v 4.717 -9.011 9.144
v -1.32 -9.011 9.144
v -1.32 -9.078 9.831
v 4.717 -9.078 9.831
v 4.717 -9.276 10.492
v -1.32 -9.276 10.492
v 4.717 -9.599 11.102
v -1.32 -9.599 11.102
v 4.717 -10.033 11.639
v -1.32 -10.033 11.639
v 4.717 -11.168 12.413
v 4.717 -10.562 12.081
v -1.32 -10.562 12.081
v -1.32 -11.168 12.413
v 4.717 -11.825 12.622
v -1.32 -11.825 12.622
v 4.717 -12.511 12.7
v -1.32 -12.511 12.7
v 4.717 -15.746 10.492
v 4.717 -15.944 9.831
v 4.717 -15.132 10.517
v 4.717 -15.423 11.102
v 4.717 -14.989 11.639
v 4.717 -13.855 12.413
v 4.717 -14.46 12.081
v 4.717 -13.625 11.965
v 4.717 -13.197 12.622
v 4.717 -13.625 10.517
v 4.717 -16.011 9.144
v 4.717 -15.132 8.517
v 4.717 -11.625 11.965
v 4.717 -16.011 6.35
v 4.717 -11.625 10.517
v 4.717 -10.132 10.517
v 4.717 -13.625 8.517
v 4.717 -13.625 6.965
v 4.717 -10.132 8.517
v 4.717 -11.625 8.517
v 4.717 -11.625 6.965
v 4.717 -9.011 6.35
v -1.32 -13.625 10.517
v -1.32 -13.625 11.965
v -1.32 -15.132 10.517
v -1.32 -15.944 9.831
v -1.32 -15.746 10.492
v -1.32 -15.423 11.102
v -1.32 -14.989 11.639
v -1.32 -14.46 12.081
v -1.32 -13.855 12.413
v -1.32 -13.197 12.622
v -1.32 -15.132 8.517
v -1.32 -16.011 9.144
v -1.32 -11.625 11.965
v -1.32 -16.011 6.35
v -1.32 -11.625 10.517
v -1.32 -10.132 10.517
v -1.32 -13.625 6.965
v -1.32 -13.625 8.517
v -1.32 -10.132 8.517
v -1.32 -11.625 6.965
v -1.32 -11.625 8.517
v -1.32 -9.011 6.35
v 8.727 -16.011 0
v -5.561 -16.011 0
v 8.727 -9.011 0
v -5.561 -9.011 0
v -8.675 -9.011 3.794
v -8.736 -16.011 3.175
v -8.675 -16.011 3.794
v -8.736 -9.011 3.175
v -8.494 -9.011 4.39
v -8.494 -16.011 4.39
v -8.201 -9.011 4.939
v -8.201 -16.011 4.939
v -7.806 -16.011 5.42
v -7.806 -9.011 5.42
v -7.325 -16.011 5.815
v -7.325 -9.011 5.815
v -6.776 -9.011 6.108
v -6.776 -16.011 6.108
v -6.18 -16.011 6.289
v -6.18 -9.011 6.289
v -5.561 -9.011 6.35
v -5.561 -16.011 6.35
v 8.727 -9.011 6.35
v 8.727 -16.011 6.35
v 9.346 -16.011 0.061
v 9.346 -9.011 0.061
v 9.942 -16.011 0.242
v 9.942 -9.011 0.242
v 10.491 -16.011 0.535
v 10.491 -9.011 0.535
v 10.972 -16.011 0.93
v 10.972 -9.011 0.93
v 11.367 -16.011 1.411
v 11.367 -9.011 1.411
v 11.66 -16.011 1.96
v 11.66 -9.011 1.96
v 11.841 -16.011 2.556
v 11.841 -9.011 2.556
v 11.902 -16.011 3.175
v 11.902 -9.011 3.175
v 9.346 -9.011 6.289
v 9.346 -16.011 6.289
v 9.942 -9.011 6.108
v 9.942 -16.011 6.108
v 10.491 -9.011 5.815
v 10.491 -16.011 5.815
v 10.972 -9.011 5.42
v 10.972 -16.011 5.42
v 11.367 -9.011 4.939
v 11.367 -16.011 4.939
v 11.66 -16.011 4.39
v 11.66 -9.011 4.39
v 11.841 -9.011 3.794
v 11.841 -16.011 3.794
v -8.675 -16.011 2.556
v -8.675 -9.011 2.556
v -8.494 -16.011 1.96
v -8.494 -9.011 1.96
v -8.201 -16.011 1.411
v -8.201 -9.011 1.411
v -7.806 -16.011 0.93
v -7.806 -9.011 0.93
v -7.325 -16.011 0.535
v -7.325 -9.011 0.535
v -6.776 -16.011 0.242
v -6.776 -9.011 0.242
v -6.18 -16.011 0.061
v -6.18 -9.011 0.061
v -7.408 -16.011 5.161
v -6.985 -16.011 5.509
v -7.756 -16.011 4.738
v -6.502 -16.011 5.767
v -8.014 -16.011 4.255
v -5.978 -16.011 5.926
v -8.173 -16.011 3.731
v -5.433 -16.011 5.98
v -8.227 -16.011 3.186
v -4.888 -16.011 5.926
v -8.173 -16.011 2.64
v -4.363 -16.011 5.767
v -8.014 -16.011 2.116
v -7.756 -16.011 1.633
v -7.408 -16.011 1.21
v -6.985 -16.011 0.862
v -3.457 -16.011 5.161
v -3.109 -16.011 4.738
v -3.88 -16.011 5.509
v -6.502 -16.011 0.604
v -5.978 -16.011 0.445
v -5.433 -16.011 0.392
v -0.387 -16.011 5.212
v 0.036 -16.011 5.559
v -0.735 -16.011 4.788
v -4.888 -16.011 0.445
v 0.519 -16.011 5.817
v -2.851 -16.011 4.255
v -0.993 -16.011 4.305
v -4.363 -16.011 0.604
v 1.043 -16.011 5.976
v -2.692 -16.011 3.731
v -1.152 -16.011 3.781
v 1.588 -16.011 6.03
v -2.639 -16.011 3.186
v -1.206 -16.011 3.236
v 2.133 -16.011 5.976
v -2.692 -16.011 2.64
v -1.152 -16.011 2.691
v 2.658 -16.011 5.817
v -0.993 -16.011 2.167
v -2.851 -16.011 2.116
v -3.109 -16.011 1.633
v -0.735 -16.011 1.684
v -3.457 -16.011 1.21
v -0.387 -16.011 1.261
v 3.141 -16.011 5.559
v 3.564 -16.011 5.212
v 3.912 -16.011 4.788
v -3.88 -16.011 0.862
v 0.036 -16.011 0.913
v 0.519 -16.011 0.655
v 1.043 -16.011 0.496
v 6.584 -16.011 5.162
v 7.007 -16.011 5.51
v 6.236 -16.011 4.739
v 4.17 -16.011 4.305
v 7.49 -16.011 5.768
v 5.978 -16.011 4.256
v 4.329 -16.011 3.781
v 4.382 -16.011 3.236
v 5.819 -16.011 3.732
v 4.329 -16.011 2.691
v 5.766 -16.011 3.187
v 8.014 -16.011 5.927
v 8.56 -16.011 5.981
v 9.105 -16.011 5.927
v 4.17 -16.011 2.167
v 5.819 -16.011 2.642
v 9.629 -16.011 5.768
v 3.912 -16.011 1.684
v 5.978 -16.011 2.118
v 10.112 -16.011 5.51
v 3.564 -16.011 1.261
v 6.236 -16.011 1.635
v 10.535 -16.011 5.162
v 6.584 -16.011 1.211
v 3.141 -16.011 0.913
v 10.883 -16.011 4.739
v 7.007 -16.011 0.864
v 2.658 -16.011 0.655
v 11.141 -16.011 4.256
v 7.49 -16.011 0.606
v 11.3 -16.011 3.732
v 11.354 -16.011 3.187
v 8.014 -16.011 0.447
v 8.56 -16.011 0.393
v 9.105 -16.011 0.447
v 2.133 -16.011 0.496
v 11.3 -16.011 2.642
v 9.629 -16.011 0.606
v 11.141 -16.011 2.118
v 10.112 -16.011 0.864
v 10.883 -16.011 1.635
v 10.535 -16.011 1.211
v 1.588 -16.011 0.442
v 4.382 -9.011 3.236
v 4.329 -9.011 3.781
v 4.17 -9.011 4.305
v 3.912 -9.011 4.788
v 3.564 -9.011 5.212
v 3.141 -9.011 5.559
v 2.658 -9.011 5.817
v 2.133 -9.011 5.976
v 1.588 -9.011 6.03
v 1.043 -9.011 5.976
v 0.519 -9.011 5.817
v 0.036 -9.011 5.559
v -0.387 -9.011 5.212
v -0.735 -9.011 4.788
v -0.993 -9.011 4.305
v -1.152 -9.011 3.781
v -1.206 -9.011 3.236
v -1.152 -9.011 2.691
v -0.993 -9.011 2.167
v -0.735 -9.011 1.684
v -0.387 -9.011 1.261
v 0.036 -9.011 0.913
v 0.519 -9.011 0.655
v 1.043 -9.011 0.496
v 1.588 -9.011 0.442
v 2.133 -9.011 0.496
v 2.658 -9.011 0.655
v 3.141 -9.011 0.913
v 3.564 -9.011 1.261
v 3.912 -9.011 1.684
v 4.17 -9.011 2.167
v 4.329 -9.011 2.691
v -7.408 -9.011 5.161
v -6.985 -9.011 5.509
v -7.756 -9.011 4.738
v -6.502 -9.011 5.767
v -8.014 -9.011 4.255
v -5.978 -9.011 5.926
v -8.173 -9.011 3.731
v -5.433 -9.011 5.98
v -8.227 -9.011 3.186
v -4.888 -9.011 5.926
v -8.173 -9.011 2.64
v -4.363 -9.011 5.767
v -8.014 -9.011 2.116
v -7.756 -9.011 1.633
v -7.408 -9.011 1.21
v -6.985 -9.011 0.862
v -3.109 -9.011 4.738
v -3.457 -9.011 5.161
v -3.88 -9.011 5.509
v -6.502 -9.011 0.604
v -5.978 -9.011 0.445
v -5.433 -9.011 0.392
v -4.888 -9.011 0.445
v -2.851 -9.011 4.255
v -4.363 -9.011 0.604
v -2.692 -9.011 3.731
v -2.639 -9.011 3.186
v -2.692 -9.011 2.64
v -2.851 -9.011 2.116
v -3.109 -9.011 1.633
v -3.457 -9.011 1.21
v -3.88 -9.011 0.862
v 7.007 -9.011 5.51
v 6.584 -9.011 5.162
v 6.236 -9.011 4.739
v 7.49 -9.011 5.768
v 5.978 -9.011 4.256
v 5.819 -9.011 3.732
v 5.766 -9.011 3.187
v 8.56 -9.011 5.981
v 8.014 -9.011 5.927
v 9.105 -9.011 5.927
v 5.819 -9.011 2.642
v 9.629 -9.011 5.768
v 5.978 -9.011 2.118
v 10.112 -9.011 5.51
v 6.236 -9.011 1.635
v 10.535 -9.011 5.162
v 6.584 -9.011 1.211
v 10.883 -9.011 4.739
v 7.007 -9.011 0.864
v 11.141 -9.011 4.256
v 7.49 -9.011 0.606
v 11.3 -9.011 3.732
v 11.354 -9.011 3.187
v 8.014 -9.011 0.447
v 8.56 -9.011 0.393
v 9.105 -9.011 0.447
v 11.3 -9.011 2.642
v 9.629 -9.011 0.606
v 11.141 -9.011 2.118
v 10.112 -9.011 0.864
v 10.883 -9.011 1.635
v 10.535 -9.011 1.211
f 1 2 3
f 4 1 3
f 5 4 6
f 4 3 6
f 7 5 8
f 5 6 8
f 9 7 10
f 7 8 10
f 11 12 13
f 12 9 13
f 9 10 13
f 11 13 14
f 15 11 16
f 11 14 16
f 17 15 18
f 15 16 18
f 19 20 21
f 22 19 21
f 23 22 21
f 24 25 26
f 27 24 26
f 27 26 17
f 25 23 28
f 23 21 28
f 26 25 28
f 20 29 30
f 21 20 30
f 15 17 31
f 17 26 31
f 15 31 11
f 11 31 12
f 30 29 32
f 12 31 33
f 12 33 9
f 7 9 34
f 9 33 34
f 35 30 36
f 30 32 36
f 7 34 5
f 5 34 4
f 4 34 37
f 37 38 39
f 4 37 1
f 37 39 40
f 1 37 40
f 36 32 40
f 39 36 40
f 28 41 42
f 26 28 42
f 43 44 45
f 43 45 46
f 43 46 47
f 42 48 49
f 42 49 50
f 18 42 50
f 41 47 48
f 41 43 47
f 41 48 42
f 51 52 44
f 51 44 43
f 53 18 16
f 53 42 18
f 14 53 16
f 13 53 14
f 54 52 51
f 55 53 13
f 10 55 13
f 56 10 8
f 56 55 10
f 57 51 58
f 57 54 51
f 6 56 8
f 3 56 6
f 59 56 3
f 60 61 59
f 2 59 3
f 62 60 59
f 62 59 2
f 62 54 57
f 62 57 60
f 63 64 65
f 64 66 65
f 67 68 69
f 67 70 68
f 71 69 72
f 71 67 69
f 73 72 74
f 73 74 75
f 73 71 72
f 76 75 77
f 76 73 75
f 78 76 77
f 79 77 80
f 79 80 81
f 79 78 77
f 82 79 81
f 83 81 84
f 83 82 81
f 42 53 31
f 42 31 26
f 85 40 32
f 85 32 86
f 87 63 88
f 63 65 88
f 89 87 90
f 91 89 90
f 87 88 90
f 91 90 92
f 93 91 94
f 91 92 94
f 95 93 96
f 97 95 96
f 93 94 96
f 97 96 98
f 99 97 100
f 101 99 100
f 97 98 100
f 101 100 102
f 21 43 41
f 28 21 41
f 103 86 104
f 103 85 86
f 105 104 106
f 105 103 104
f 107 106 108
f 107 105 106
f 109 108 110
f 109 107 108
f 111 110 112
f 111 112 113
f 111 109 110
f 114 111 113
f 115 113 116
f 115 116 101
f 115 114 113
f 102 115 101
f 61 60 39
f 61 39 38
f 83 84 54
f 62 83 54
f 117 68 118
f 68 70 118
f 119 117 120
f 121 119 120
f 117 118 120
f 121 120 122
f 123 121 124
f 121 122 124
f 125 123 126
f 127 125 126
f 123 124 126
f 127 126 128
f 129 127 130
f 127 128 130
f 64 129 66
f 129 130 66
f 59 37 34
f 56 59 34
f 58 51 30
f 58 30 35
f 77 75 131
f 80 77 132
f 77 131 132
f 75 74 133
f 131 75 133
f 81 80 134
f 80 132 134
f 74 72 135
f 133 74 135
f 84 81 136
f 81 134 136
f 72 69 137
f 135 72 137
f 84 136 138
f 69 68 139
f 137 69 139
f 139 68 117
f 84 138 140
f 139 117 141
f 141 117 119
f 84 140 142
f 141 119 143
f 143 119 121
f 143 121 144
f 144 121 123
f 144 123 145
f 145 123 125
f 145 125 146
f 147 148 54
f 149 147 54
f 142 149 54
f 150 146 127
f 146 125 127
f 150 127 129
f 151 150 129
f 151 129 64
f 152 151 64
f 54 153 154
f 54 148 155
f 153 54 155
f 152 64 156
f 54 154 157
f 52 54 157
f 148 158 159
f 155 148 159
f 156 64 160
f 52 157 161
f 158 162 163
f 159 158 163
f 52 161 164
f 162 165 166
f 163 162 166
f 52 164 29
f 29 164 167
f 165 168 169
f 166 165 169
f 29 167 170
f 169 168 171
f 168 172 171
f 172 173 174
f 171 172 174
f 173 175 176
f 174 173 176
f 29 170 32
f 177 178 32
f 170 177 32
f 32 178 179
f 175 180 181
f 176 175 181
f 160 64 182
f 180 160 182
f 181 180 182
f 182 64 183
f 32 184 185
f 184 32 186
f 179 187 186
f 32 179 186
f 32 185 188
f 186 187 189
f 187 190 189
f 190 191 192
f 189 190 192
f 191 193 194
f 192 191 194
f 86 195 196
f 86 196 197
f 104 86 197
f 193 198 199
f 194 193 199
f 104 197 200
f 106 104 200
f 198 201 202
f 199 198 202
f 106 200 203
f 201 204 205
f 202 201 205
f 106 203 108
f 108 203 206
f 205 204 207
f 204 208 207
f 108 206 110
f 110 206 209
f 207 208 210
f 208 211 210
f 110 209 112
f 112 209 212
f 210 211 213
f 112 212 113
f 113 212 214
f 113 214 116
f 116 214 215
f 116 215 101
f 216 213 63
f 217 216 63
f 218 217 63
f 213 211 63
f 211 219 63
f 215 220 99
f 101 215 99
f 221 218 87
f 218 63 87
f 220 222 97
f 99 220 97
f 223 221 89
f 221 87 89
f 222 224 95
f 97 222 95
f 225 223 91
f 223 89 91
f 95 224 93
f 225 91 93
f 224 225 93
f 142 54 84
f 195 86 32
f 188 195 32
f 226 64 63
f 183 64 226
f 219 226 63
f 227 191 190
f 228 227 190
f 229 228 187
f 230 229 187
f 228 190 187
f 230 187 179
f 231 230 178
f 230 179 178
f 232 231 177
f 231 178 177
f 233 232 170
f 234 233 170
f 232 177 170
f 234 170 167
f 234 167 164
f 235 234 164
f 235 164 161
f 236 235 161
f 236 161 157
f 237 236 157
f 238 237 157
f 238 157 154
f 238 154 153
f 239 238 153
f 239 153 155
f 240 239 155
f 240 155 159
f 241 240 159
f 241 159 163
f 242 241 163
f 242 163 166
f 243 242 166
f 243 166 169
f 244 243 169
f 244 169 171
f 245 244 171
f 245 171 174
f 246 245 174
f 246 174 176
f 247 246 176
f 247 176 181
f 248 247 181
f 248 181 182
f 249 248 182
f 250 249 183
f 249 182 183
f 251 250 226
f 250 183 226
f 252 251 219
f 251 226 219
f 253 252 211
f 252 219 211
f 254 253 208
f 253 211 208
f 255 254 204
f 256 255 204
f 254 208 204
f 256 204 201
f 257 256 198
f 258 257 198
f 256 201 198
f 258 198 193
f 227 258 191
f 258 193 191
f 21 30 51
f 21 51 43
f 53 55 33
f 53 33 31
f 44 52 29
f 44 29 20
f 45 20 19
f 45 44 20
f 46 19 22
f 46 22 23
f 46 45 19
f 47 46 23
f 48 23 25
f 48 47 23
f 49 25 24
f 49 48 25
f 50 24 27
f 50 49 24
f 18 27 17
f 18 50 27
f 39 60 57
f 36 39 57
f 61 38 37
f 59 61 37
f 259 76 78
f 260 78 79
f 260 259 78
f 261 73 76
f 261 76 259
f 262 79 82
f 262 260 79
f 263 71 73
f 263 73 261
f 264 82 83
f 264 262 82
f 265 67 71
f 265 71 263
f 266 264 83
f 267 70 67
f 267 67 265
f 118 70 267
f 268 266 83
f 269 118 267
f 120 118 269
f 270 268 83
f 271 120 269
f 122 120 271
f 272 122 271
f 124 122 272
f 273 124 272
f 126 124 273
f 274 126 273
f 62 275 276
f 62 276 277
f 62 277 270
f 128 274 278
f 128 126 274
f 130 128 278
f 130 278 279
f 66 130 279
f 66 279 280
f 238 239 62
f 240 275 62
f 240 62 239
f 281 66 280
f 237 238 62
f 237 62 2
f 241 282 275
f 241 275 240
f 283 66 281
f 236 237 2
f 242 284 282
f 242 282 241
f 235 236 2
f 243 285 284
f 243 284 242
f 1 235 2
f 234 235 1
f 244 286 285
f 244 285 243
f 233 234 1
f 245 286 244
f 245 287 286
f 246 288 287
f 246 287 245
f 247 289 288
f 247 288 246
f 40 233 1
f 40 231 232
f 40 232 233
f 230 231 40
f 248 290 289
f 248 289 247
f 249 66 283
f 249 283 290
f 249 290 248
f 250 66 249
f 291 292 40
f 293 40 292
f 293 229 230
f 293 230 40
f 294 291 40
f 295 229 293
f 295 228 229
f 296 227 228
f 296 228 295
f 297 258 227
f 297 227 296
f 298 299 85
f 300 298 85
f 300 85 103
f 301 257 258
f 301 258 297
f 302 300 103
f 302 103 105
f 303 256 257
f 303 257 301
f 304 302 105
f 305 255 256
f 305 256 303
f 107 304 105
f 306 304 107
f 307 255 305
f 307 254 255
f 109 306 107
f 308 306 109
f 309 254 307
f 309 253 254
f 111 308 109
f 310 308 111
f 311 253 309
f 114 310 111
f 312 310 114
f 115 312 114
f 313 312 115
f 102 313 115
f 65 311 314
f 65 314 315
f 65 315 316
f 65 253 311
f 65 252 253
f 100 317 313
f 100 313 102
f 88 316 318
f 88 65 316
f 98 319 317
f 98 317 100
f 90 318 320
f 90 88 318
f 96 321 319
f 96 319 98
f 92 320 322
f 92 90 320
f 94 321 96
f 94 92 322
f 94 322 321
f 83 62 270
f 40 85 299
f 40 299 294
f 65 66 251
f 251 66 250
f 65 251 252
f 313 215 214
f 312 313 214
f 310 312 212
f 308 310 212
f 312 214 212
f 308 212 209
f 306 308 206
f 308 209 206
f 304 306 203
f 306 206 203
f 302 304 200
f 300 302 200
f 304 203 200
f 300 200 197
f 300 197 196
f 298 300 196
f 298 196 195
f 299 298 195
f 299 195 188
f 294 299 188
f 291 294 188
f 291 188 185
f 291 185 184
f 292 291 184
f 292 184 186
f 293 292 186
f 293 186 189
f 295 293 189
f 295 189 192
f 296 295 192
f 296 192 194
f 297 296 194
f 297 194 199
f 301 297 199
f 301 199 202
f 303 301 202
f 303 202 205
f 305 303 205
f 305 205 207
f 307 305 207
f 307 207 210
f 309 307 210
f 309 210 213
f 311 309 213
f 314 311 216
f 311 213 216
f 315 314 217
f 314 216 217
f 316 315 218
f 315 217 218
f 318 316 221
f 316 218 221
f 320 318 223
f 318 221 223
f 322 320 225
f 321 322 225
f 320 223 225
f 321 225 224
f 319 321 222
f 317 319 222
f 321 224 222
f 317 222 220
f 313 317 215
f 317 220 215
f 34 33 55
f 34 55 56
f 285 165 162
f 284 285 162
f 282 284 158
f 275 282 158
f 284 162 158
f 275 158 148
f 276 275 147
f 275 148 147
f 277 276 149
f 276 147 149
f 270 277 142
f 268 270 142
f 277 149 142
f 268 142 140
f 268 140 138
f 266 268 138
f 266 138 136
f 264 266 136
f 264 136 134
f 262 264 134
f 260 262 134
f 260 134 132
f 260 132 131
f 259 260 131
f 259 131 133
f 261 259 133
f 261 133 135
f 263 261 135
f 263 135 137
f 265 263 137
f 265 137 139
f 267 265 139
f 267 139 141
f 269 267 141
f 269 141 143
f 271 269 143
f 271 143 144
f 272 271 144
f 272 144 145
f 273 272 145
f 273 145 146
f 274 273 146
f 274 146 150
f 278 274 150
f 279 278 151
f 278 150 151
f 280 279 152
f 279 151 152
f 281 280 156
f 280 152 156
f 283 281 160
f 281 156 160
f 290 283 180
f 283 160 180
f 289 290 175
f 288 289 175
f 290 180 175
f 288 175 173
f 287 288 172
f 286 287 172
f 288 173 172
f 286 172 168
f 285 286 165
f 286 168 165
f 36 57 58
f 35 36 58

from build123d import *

# Parameters (mm, degrees)
F0_W        = 20.6375
F0_H        = 7
F1_DEPTH    = 6.35
F2_R        = 2.794
F3_DEPTH    = 8
F4_R        = 3.17499
F5_W        = 6.0368906707
F5_H        = 7
F6_DEPTH    = 6.35
F7_T1_DEPTH = 23.8168906707
F8_W        = 2
F8_H        = 5
F9_DEPTH    = 6.35
F10_W       = 1.5076477192
F10_H       = 2
F10_W_2     = 1.4923522808
F10_W_3     = 2
F10_H_2     = 1.5520717202
F11_DEPTH   = 6.35


# Not quite as in the source:
# - a fillet or chamfer that OpenCascade refuses, or shapes differently, is made with other operations: its cross-section is extruded or revolved along the edge and cut away or added
# - a fillet or chamfer is up to 0.001 mm smaller than in the source, because OpenCascade refuses the exact size


with BuildPart() as f1:
    # F0 (on Top) → F1 (new body)
    with BuildSketch(Plane.XY):
        with Locations((1.5829298645, -12.5110630834)):
            Rectangle(F0_W, F0_H)
    extrude(amount=F1_DEPTH)

    # F2 (on face) → F3 (cut)
    with BuildSketch(Plane.XZ.offset(16.0110630834)):
        with Locations((-5.4325845507, 3.1855095279)):
            Circle(F2_R)
        with Locations((1.5883980845, 3.2361580911)):
            Circle(F2_R)
        with Locations((8.5595190756, 3.1868351264)):
            Circle(F2_R)
    extrude(amount=-F3_DEPTH, mode=Mode.SUBTRACT)

    # F4 (radius 3.175 in the source; OpenCascade refuses exactly that, so slightly less here)
    f4_edges = [f1.edges().sort_by_distance(p)[0] for p in [
        (11.90168, -12.511063, 6.35),
        (11.90168, -12.511063, 0),
        (-8.73582, -12.511063, 6.35),
        (-8.73582, -12.511063, 0),
    ]]
    fillet(f4_edges, radius=F4_R)

    # F5 (on face) → F6 (join)
    with BuildSketch(Plane.XY.offset(6.35)):
        with Locations((1.6981104854, -12.5110630834)):
            Rectangle(F5_W, F5_H)
    extrude(amount=F6_DEPTH)

    # F7: fillet of radius 3.556 on 2 edges, made by hand

    # F7_s2 → F7_t1 (cut)
    with BuildSketch(Plane.YZ.offset(-10.2103348499)):
        with BuildLine():
            ThreePointArc((-16.0110630834, 9.144), (-14.9695347973, 11.6584717139), (-12.4550630834, 12.7))
            Line((-12.4550630834, 12.7), (-16.0110630834, 12.7))
            Line((-16.0110630834, 12.7), (-16.0110630834, 9.144))
        make_face()
        with BuildLine():
            ThreePointArc((-9.0110630834, 9.144), (-10.0525913695, 11.6584717139), (-12.5670630834, 12.7))
            Line((-12.5670630834, 12.7), (-9.0110630834, 12.7))
            Line((-9.0110630834, 12.7), (-9.0110630834, 9.144))
        make_face()
    extrude(amount=F7_T1_DEPTH, mode=Mode.SUBTRACT)

    # F8 (on face) → F9 (cut)
    with BuildSketch(Plane(origin=(-1.3203348499, 0, 0), x_dir=(0, -1, 0), z_dir=(-1, 0, 0))):
        with Locations((12.6245897673, 9.4653457722)):
            Rectangle(F8_W, F8_H)
    extrude(amount=-F9_DEPTH, mode=Mode.SUBTRACT)

    # F10 (on face) → F11 (cut)
    with BuildSketch(Plane.YZ.offset(4.7165558208)):
        with Locations((-14.3784136269, 9.5174174924)):
            Rectangle(F10_W, F10_H)
        with Locations((-10.8784136269, 9.5174174924)):
            Rectangle(F10_W_2, F10_H)
        with Locations((-12.6245897673, 7.7413816323)):
            Rectangle(F10_W_3, F10_H_2)
    extrude(amount=-F11_DEPTH, mode=Mode.SUBTRACT)


solid = f1.part
